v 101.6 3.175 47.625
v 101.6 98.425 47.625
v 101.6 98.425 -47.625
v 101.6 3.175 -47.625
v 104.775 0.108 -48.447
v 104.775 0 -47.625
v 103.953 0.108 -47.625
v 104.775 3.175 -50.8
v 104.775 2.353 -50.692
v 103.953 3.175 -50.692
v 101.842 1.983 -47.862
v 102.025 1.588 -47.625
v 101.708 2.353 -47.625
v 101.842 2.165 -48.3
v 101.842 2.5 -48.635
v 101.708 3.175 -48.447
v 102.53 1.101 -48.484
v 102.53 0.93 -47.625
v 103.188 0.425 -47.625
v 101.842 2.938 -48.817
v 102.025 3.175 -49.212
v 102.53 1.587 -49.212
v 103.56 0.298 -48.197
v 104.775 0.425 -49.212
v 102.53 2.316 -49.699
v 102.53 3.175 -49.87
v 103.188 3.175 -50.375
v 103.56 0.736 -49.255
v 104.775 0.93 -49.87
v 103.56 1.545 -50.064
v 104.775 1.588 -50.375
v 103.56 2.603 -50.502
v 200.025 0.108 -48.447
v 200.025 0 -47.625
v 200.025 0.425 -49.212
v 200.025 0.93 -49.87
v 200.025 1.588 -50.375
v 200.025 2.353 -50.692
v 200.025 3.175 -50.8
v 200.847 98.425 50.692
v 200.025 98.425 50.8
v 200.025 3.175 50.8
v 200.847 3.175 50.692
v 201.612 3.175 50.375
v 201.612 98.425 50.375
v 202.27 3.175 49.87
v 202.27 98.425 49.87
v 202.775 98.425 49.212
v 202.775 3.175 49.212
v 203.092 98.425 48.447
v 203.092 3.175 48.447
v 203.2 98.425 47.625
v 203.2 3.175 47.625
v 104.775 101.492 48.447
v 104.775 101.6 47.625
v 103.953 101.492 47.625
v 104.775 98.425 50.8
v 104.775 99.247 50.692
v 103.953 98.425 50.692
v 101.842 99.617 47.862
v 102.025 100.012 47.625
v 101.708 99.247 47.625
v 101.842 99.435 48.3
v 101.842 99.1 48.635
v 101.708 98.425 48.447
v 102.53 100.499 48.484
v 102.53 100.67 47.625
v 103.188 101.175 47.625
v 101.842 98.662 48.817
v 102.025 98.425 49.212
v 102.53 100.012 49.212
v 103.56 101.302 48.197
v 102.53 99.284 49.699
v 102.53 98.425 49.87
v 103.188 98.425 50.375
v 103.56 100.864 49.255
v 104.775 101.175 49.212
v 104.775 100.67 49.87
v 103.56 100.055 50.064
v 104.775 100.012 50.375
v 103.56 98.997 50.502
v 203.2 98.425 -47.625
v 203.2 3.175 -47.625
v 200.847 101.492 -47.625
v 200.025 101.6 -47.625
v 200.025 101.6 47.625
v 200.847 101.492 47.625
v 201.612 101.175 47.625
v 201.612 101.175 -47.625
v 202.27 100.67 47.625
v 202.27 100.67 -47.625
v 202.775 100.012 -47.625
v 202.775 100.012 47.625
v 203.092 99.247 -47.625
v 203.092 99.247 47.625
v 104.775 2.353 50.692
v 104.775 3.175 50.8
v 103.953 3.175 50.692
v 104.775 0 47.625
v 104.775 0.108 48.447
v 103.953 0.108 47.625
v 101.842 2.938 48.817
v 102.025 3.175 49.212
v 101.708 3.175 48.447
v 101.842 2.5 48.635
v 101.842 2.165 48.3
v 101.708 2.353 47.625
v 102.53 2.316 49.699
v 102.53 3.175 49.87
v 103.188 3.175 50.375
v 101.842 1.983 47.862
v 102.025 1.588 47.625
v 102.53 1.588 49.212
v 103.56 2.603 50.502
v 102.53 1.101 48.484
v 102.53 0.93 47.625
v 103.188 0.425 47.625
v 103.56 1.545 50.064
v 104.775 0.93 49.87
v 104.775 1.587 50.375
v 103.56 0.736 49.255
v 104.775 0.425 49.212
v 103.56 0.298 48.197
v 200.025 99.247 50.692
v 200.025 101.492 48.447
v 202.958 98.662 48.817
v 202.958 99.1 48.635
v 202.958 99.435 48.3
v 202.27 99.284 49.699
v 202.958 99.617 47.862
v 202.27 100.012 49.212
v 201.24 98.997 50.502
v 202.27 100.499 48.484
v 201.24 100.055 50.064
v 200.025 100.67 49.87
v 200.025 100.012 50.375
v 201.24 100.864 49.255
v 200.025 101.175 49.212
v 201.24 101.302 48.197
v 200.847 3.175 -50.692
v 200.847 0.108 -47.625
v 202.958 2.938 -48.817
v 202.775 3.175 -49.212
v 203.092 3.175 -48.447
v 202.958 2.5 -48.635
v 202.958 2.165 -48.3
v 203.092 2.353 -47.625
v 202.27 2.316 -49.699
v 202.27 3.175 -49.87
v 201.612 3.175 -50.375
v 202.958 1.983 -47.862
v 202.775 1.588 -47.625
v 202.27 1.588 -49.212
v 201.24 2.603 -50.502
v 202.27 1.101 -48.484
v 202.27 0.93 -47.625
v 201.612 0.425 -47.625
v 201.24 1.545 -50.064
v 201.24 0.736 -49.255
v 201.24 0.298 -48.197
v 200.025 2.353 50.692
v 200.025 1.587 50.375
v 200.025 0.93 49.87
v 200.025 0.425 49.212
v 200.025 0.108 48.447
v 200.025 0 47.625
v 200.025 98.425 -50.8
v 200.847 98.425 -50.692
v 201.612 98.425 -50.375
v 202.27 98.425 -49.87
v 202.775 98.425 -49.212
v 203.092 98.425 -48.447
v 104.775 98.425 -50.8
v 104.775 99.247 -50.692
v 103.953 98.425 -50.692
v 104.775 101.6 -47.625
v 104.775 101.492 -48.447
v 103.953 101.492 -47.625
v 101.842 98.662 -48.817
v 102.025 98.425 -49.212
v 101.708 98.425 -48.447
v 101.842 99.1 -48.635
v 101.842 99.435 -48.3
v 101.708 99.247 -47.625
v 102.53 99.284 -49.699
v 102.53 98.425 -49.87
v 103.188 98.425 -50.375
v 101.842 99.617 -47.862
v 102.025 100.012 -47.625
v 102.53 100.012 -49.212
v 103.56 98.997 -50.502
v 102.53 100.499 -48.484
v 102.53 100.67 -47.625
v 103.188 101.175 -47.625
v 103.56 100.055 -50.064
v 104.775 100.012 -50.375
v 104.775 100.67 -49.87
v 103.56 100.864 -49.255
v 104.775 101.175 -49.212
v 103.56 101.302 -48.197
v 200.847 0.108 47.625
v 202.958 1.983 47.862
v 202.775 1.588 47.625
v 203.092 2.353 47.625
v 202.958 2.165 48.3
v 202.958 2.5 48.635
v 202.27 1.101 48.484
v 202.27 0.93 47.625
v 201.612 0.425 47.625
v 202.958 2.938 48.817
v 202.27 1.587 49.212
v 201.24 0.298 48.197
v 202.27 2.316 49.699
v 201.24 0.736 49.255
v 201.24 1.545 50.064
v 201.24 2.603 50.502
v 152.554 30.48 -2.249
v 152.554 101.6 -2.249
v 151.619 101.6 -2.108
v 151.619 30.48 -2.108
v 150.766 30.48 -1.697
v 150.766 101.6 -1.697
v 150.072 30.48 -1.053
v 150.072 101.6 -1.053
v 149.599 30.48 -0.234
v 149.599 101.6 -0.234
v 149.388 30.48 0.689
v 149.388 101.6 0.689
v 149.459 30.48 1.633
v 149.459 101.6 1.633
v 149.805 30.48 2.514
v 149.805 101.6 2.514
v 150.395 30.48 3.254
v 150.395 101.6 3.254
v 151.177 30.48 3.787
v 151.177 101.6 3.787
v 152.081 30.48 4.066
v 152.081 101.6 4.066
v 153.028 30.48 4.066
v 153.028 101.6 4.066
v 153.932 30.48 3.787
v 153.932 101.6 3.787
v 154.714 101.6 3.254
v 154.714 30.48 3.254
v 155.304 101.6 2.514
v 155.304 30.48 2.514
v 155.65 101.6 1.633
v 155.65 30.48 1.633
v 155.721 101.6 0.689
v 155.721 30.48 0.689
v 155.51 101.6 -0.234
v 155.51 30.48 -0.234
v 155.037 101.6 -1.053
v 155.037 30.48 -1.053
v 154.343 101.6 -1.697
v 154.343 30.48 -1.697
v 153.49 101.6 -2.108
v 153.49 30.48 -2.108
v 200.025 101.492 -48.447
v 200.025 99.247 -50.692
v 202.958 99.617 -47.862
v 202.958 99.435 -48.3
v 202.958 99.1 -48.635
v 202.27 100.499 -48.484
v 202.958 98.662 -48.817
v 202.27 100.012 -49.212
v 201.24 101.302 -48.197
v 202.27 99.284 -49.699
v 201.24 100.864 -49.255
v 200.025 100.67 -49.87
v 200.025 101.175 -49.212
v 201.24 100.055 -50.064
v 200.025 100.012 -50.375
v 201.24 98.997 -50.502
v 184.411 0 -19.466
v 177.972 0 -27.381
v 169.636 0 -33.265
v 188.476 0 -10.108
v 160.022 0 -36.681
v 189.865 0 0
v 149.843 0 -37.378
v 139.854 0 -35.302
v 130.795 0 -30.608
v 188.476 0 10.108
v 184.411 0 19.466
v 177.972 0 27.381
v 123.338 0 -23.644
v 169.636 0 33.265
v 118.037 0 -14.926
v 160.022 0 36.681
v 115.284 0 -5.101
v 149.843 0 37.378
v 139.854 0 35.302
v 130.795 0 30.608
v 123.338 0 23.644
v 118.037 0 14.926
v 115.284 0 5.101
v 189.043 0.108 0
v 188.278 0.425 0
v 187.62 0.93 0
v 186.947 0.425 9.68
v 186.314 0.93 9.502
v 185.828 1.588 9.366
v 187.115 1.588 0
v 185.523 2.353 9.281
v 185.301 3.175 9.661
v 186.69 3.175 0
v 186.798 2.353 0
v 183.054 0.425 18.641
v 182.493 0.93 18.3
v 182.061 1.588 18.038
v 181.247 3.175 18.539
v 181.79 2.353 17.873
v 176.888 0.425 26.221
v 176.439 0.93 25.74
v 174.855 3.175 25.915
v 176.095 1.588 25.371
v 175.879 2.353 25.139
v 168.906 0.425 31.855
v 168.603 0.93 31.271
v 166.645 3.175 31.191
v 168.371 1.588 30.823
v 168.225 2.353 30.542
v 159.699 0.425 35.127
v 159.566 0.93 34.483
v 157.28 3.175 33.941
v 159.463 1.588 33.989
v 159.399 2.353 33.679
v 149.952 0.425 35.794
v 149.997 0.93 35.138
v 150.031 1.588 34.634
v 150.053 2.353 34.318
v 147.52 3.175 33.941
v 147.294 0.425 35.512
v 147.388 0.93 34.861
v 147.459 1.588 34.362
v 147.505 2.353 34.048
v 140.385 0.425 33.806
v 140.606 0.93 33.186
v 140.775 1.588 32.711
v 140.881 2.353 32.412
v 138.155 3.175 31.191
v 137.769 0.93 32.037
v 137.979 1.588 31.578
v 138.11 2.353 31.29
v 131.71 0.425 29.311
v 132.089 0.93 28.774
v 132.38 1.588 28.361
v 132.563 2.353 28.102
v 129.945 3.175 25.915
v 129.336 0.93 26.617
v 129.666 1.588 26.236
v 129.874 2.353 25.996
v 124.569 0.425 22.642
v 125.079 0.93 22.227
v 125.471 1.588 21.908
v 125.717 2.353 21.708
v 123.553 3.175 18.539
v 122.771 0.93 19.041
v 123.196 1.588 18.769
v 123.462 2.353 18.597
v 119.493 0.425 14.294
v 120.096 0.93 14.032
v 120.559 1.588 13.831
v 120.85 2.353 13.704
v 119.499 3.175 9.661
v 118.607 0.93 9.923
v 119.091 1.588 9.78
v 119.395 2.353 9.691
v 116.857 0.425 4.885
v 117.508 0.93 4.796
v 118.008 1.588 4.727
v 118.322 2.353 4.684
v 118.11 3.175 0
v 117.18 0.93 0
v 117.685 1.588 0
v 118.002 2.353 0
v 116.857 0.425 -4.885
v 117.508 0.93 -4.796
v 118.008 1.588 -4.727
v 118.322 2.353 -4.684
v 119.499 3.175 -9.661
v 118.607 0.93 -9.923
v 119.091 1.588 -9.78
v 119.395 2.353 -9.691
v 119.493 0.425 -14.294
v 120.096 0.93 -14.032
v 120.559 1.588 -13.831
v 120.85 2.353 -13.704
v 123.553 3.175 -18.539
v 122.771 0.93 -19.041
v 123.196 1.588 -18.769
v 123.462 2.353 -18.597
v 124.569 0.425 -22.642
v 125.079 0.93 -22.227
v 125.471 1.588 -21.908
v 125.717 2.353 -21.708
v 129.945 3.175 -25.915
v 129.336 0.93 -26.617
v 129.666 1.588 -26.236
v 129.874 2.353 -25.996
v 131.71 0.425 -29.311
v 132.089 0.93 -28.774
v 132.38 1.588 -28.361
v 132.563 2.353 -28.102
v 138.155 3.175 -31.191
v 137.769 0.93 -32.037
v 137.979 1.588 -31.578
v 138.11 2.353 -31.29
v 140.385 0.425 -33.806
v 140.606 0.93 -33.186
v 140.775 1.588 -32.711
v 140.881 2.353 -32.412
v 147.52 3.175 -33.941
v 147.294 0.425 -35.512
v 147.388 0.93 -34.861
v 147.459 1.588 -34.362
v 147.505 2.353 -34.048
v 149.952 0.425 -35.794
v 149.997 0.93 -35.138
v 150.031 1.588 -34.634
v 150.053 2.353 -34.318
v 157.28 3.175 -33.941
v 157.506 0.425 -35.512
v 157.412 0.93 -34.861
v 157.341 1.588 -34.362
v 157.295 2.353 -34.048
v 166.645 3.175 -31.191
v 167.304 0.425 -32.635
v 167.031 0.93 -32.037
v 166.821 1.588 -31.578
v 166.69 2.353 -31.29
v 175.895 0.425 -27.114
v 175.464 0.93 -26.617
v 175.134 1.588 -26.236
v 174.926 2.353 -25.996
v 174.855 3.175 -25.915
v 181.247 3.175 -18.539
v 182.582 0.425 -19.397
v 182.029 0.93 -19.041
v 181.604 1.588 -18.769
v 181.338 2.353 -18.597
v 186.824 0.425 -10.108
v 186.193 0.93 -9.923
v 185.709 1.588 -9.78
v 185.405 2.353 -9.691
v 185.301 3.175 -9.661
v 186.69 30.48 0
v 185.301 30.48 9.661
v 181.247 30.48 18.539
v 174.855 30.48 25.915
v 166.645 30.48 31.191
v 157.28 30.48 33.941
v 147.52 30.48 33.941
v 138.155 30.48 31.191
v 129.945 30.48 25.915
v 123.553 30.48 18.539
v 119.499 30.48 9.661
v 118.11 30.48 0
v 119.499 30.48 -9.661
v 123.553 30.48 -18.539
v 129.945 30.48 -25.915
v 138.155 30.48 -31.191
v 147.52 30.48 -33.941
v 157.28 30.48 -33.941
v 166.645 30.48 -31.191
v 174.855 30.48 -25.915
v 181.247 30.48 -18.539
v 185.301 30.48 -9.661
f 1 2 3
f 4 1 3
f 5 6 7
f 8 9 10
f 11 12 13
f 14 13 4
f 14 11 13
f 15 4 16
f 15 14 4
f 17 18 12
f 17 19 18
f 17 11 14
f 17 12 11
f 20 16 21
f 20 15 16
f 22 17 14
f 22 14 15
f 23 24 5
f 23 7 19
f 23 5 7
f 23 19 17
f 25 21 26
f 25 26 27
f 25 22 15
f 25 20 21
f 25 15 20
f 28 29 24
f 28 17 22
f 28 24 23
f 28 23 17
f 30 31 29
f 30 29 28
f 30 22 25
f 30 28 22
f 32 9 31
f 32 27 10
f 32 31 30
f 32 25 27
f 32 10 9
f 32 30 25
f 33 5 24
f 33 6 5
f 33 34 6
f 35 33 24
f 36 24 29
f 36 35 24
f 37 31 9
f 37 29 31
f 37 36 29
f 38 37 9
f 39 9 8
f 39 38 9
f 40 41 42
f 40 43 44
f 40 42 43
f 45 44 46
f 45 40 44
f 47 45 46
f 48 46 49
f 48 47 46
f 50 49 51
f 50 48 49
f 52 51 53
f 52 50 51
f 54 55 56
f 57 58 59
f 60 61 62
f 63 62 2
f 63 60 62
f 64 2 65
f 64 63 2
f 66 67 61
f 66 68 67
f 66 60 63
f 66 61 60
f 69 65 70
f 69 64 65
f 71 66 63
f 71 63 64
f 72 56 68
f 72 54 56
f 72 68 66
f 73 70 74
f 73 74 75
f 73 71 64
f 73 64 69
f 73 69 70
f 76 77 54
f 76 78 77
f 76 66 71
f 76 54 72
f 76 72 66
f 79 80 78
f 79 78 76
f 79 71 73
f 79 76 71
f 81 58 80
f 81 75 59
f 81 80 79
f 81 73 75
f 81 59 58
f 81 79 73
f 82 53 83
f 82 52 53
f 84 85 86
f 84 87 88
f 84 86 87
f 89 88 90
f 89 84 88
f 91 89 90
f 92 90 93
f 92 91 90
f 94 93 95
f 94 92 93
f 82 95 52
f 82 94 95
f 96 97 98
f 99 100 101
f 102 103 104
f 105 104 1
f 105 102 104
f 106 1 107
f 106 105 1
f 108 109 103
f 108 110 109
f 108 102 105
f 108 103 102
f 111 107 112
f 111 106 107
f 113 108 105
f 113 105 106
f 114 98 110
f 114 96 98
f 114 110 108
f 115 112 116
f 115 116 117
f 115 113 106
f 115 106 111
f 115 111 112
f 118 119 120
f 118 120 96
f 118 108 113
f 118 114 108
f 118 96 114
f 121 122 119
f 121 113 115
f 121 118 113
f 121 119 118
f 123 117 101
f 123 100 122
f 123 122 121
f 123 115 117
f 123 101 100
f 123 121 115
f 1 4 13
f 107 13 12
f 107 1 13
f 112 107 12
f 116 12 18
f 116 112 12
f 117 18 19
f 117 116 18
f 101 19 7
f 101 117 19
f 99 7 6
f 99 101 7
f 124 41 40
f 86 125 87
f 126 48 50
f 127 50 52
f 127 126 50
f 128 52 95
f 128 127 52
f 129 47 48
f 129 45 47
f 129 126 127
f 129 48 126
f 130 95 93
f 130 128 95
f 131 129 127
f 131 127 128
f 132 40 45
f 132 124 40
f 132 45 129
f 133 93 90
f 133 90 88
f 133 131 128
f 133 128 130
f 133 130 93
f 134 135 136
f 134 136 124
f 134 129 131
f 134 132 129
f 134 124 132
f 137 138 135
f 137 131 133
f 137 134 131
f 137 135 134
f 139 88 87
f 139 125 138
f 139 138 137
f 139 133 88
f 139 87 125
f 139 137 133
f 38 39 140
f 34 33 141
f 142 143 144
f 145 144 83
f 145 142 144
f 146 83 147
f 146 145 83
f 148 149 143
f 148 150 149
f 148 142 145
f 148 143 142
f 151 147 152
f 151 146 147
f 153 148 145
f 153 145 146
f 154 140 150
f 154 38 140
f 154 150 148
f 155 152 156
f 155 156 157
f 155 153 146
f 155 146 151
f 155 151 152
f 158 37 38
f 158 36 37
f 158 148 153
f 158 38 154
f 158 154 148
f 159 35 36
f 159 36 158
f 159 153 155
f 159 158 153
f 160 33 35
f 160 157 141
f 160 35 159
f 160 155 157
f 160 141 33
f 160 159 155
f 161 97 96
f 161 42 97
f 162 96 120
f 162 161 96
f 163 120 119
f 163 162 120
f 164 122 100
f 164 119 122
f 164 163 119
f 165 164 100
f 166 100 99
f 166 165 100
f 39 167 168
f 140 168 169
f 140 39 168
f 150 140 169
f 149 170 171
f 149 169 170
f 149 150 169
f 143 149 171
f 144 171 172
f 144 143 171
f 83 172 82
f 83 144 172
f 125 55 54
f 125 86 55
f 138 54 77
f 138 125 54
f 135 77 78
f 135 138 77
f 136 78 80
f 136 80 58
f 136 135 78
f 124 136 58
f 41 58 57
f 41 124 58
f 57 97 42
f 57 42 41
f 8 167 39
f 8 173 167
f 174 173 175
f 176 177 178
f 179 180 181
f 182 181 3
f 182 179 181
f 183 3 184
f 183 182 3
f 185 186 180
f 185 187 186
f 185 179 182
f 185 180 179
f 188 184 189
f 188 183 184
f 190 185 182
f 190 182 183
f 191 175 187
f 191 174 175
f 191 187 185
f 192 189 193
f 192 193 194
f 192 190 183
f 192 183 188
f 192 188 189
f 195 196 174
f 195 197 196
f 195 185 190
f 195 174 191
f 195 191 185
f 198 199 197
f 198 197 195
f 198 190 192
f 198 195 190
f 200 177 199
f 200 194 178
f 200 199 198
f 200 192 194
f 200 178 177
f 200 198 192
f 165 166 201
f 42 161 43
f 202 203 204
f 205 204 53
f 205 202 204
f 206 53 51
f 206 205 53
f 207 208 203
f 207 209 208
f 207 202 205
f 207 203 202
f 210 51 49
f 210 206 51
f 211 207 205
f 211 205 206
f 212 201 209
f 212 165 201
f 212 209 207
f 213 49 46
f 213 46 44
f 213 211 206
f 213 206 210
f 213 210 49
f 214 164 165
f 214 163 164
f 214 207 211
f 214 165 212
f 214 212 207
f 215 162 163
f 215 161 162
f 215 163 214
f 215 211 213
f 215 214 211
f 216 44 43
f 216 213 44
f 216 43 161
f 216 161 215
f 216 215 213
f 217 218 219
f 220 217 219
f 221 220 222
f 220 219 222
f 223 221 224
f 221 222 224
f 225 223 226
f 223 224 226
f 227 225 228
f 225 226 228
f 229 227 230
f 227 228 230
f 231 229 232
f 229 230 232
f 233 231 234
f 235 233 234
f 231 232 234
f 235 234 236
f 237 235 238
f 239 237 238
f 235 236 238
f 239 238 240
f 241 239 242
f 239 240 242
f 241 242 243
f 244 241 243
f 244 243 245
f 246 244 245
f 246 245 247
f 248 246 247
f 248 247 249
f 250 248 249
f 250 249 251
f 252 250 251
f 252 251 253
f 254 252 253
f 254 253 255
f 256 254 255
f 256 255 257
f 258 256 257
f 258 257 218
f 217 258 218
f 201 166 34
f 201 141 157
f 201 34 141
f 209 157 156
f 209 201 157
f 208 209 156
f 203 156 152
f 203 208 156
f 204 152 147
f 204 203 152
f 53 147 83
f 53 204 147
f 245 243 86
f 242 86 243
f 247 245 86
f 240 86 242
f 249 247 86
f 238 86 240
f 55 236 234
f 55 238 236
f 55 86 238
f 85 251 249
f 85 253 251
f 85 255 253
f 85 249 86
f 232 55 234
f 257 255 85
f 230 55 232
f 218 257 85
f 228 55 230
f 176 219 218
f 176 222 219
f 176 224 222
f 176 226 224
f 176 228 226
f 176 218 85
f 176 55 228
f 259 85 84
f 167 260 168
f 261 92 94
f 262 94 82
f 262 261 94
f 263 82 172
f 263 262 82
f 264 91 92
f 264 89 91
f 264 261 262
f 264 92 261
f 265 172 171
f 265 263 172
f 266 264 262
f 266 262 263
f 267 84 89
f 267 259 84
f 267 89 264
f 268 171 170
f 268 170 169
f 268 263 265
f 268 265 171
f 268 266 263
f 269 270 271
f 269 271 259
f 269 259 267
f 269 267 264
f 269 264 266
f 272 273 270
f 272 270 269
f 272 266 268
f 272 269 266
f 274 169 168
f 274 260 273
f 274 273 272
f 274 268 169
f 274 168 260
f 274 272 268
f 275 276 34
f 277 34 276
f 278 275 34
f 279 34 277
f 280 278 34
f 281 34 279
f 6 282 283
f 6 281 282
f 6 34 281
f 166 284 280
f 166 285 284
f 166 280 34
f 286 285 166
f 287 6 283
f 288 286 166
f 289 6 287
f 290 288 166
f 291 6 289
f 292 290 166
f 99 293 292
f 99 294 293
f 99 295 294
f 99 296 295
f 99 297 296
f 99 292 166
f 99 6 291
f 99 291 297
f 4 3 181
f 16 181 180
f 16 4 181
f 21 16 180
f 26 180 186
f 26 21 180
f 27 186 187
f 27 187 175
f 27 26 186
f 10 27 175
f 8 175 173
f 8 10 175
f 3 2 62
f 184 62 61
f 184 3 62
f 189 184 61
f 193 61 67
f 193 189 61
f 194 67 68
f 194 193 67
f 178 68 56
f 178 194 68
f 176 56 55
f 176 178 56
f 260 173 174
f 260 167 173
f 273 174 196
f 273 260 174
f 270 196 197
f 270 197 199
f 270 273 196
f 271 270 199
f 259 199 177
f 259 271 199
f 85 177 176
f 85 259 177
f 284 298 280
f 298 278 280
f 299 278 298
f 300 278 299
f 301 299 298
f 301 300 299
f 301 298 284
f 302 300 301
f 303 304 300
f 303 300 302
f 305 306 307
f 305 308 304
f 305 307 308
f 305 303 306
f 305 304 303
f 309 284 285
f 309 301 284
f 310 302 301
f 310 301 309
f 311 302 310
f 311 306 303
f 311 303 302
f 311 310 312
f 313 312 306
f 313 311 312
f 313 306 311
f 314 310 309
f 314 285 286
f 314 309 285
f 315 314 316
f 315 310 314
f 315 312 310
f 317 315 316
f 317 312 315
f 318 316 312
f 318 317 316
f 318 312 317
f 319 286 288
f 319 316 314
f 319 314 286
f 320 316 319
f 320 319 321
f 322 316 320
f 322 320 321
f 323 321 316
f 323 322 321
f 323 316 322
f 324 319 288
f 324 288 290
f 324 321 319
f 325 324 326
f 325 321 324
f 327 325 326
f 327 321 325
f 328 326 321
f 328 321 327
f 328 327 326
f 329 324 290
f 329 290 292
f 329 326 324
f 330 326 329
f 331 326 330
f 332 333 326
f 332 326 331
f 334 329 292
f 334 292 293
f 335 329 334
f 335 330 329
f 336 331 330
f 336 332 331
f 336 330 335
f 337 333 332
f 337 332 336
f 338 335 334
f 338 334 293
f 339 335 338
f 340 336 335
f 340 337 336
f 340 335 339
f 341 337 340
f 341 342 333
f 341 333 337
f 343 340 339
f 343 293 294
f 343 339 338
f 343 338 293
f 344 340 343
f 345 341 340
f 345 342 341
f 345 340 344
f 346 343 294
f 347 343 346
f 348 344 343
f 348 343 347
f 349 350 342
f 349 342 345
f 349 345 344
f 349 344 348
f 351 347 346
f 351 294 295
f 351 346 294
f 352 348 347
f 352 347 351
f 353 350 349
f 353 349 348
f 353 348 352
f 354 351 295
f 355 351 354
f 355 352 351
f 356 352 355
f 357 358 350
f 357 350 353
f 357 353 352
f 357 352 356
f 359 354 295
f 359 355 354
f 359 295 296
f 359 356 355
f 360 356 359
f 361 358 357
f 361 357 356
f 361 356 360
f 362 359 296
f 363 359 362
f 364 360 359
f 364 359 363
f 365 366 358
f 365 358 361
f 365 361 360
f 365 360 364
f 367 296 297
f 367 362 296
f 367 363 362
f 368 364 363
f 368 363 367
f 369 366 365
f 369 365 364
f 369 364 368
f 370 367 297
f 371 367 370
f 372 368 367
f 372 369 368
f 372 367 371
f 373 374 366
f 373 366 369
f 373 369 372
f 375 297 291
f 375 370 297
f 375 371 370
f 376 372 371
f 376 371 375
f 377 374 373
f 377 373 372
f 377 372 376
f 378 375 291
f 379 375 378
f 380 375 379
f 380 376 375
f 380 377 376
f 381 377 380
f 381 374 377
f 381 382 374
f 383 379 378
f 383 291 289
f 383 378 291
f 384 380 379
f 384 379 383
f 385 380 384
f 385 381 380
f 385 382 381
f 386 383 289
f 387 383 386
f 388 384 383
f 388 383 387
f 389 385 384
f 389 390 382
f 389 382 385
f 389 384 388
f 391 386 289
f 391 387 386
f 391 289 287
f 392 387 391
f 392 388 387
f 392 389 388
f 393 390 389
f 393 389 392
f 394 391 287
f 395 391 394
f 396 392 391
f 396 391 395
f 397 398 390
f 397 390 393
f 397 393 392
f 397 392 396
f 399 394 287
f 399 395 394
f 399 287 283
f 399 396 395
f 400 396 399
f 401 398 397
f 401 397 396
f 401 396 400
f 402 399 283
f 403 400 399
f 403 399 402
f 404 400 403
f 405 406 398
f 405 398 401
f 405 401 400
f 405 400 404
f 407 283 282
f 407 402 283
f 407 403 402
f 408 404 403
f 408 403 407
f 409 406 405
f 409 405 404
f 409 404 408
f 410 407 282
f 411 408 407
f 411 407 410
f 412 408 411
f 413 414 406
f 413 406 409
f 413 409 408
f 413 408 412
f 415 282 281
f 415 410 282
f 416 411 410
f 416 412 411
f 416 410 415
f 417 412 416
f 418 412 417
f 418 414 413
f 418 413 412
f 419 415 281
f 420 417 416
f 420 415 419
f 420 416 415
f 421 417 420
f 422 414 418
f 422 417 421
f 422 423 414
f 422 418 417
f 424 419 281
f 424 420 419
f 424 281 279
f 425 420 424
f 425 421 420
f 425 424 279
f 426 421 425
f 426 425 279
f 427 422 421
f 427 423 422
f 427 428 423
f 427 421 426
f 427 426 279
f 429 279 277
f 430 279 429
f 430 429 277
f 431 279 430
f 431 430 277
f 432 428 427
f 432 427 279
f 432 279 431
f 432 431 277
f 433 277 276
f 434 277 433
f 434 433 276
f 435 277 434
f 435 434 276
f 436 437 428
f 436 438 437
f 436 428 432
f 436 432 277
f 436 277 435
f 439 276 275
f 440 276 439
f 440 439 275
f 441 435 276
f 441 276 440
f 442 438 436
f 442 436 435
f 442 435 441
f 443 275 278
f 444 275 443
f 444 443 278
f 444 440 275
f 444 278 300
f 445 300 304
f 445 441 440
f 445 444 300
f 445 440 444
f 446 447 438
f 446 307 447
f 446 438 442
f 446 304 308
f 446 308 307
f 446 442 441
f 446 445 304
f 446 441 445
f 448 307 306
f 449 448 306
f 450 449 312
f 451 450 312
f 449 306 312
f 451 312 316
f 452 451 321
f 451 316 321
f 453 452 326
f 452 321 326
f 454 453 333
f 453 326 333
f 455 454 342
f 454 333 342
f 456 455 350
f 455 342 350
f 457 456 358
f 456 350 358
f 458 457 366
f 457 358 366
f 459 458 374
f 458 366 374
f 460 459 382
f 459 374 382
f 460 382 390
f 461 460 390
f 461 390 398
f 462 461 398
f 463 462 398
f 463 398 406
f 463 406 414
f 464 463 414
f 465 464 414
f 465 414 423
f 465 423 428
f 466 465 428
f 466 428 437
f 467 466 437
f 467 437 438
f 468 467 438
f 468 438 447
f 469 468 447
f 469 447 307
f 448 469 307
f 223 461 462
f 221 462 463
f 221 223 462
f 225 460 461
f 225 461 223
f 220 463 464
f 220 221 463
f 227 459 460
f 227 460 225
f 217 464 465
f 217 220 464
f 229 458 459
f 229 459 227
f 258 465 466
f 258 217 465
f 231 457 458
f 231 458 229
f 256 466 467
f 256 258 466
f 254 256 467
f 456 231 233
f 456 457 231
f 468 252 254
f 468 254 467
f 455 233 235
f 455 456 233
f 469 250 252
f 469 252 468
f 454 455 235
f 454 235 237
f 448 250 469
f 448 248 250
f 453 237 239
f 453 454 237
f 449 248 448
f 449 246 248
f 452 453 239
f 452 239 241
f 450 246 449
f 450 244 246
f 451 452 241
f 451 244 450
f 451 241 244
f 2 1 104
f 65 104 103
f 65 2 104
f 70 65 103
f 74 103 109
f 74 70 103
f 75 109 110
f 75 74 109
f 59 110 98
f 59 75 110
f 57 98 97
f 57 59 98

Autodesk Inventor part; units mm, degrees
ref_plane "YZ Plane" through (0, 0, 0) normal (1, 0, 0) x (0, 1, 0)
ref_plane "XZ Plane" through (0, 0, 0) normal (0, 1, 0) x (-1, 0, 0)
ref_plane "XY Plane" through (0, 0, 0) normal (0, 0, 1) x (1, 0, 0)
ref_plane "Work Plane3" through (101.6, 2.54, 38.1) normal (1, 0, 0) x (0, 0, -1)
sketch "Sketch1" plane through (101.6, 2.54, 38.1) normal (1, 0, 0) x (0, 0, -1)
  line L0 (88.9, -2.54) -> (-12.7, -2.54)
  line L1 (-12.7, -2.54) -> (-12.7, 99.06)
  line L2 (-12.7, 99.06) -> (88.9, 99.06)
  line L3 (88.9, 99.06) -> (88.9, -2.54)
  point P0 (38.1, -2.54)
extrude "Extrusion1" add sketch "Sketch1" along normal blind 101.6
sketch "Sketch2" plane through (101.6, 0, -50.8) normal (0, -1, 0) x (1, 0, 0)
  circle A0 centre (50.8, 50.8) radius 34.29
  point P0 (-101.6, 50.8)
  dimension "d3" = 68.58
extrude "Extrusion2" cut sketch "Sketch2" against normal blind 30.48
fillet "Fillet5" radius 3.175 13 edges at (152.4, 0, -50.8) (152.4, 101.6, -50.8) (101.6, 50.8, -50.8) (203.2, 50.8, -50.8) (152.4, 0, 50.8) (101.6, 0, 0) (203.2, 0, 0) (118.11, 0, 0) (152.4, 101.6, 50.8) (101.6, 101.6, 0) (203.2, 101.6, 0) (101.6, 50.8, 50.8) (203.2, 50.8, 50.8)
sketch "Sketch7" plane through (152.4, 30.48, 0) normal (0, -1, 0) x (1, 0, 0)
  point P0 (-152.4, 0)
  point P1 (0.1544, 0.9264)
hole "Hole1" at (152.5544, 30.48, 0.9264) direction (0, 1, 0) diameter 6.35 end through all
properties part number "1x2 Block v2"
